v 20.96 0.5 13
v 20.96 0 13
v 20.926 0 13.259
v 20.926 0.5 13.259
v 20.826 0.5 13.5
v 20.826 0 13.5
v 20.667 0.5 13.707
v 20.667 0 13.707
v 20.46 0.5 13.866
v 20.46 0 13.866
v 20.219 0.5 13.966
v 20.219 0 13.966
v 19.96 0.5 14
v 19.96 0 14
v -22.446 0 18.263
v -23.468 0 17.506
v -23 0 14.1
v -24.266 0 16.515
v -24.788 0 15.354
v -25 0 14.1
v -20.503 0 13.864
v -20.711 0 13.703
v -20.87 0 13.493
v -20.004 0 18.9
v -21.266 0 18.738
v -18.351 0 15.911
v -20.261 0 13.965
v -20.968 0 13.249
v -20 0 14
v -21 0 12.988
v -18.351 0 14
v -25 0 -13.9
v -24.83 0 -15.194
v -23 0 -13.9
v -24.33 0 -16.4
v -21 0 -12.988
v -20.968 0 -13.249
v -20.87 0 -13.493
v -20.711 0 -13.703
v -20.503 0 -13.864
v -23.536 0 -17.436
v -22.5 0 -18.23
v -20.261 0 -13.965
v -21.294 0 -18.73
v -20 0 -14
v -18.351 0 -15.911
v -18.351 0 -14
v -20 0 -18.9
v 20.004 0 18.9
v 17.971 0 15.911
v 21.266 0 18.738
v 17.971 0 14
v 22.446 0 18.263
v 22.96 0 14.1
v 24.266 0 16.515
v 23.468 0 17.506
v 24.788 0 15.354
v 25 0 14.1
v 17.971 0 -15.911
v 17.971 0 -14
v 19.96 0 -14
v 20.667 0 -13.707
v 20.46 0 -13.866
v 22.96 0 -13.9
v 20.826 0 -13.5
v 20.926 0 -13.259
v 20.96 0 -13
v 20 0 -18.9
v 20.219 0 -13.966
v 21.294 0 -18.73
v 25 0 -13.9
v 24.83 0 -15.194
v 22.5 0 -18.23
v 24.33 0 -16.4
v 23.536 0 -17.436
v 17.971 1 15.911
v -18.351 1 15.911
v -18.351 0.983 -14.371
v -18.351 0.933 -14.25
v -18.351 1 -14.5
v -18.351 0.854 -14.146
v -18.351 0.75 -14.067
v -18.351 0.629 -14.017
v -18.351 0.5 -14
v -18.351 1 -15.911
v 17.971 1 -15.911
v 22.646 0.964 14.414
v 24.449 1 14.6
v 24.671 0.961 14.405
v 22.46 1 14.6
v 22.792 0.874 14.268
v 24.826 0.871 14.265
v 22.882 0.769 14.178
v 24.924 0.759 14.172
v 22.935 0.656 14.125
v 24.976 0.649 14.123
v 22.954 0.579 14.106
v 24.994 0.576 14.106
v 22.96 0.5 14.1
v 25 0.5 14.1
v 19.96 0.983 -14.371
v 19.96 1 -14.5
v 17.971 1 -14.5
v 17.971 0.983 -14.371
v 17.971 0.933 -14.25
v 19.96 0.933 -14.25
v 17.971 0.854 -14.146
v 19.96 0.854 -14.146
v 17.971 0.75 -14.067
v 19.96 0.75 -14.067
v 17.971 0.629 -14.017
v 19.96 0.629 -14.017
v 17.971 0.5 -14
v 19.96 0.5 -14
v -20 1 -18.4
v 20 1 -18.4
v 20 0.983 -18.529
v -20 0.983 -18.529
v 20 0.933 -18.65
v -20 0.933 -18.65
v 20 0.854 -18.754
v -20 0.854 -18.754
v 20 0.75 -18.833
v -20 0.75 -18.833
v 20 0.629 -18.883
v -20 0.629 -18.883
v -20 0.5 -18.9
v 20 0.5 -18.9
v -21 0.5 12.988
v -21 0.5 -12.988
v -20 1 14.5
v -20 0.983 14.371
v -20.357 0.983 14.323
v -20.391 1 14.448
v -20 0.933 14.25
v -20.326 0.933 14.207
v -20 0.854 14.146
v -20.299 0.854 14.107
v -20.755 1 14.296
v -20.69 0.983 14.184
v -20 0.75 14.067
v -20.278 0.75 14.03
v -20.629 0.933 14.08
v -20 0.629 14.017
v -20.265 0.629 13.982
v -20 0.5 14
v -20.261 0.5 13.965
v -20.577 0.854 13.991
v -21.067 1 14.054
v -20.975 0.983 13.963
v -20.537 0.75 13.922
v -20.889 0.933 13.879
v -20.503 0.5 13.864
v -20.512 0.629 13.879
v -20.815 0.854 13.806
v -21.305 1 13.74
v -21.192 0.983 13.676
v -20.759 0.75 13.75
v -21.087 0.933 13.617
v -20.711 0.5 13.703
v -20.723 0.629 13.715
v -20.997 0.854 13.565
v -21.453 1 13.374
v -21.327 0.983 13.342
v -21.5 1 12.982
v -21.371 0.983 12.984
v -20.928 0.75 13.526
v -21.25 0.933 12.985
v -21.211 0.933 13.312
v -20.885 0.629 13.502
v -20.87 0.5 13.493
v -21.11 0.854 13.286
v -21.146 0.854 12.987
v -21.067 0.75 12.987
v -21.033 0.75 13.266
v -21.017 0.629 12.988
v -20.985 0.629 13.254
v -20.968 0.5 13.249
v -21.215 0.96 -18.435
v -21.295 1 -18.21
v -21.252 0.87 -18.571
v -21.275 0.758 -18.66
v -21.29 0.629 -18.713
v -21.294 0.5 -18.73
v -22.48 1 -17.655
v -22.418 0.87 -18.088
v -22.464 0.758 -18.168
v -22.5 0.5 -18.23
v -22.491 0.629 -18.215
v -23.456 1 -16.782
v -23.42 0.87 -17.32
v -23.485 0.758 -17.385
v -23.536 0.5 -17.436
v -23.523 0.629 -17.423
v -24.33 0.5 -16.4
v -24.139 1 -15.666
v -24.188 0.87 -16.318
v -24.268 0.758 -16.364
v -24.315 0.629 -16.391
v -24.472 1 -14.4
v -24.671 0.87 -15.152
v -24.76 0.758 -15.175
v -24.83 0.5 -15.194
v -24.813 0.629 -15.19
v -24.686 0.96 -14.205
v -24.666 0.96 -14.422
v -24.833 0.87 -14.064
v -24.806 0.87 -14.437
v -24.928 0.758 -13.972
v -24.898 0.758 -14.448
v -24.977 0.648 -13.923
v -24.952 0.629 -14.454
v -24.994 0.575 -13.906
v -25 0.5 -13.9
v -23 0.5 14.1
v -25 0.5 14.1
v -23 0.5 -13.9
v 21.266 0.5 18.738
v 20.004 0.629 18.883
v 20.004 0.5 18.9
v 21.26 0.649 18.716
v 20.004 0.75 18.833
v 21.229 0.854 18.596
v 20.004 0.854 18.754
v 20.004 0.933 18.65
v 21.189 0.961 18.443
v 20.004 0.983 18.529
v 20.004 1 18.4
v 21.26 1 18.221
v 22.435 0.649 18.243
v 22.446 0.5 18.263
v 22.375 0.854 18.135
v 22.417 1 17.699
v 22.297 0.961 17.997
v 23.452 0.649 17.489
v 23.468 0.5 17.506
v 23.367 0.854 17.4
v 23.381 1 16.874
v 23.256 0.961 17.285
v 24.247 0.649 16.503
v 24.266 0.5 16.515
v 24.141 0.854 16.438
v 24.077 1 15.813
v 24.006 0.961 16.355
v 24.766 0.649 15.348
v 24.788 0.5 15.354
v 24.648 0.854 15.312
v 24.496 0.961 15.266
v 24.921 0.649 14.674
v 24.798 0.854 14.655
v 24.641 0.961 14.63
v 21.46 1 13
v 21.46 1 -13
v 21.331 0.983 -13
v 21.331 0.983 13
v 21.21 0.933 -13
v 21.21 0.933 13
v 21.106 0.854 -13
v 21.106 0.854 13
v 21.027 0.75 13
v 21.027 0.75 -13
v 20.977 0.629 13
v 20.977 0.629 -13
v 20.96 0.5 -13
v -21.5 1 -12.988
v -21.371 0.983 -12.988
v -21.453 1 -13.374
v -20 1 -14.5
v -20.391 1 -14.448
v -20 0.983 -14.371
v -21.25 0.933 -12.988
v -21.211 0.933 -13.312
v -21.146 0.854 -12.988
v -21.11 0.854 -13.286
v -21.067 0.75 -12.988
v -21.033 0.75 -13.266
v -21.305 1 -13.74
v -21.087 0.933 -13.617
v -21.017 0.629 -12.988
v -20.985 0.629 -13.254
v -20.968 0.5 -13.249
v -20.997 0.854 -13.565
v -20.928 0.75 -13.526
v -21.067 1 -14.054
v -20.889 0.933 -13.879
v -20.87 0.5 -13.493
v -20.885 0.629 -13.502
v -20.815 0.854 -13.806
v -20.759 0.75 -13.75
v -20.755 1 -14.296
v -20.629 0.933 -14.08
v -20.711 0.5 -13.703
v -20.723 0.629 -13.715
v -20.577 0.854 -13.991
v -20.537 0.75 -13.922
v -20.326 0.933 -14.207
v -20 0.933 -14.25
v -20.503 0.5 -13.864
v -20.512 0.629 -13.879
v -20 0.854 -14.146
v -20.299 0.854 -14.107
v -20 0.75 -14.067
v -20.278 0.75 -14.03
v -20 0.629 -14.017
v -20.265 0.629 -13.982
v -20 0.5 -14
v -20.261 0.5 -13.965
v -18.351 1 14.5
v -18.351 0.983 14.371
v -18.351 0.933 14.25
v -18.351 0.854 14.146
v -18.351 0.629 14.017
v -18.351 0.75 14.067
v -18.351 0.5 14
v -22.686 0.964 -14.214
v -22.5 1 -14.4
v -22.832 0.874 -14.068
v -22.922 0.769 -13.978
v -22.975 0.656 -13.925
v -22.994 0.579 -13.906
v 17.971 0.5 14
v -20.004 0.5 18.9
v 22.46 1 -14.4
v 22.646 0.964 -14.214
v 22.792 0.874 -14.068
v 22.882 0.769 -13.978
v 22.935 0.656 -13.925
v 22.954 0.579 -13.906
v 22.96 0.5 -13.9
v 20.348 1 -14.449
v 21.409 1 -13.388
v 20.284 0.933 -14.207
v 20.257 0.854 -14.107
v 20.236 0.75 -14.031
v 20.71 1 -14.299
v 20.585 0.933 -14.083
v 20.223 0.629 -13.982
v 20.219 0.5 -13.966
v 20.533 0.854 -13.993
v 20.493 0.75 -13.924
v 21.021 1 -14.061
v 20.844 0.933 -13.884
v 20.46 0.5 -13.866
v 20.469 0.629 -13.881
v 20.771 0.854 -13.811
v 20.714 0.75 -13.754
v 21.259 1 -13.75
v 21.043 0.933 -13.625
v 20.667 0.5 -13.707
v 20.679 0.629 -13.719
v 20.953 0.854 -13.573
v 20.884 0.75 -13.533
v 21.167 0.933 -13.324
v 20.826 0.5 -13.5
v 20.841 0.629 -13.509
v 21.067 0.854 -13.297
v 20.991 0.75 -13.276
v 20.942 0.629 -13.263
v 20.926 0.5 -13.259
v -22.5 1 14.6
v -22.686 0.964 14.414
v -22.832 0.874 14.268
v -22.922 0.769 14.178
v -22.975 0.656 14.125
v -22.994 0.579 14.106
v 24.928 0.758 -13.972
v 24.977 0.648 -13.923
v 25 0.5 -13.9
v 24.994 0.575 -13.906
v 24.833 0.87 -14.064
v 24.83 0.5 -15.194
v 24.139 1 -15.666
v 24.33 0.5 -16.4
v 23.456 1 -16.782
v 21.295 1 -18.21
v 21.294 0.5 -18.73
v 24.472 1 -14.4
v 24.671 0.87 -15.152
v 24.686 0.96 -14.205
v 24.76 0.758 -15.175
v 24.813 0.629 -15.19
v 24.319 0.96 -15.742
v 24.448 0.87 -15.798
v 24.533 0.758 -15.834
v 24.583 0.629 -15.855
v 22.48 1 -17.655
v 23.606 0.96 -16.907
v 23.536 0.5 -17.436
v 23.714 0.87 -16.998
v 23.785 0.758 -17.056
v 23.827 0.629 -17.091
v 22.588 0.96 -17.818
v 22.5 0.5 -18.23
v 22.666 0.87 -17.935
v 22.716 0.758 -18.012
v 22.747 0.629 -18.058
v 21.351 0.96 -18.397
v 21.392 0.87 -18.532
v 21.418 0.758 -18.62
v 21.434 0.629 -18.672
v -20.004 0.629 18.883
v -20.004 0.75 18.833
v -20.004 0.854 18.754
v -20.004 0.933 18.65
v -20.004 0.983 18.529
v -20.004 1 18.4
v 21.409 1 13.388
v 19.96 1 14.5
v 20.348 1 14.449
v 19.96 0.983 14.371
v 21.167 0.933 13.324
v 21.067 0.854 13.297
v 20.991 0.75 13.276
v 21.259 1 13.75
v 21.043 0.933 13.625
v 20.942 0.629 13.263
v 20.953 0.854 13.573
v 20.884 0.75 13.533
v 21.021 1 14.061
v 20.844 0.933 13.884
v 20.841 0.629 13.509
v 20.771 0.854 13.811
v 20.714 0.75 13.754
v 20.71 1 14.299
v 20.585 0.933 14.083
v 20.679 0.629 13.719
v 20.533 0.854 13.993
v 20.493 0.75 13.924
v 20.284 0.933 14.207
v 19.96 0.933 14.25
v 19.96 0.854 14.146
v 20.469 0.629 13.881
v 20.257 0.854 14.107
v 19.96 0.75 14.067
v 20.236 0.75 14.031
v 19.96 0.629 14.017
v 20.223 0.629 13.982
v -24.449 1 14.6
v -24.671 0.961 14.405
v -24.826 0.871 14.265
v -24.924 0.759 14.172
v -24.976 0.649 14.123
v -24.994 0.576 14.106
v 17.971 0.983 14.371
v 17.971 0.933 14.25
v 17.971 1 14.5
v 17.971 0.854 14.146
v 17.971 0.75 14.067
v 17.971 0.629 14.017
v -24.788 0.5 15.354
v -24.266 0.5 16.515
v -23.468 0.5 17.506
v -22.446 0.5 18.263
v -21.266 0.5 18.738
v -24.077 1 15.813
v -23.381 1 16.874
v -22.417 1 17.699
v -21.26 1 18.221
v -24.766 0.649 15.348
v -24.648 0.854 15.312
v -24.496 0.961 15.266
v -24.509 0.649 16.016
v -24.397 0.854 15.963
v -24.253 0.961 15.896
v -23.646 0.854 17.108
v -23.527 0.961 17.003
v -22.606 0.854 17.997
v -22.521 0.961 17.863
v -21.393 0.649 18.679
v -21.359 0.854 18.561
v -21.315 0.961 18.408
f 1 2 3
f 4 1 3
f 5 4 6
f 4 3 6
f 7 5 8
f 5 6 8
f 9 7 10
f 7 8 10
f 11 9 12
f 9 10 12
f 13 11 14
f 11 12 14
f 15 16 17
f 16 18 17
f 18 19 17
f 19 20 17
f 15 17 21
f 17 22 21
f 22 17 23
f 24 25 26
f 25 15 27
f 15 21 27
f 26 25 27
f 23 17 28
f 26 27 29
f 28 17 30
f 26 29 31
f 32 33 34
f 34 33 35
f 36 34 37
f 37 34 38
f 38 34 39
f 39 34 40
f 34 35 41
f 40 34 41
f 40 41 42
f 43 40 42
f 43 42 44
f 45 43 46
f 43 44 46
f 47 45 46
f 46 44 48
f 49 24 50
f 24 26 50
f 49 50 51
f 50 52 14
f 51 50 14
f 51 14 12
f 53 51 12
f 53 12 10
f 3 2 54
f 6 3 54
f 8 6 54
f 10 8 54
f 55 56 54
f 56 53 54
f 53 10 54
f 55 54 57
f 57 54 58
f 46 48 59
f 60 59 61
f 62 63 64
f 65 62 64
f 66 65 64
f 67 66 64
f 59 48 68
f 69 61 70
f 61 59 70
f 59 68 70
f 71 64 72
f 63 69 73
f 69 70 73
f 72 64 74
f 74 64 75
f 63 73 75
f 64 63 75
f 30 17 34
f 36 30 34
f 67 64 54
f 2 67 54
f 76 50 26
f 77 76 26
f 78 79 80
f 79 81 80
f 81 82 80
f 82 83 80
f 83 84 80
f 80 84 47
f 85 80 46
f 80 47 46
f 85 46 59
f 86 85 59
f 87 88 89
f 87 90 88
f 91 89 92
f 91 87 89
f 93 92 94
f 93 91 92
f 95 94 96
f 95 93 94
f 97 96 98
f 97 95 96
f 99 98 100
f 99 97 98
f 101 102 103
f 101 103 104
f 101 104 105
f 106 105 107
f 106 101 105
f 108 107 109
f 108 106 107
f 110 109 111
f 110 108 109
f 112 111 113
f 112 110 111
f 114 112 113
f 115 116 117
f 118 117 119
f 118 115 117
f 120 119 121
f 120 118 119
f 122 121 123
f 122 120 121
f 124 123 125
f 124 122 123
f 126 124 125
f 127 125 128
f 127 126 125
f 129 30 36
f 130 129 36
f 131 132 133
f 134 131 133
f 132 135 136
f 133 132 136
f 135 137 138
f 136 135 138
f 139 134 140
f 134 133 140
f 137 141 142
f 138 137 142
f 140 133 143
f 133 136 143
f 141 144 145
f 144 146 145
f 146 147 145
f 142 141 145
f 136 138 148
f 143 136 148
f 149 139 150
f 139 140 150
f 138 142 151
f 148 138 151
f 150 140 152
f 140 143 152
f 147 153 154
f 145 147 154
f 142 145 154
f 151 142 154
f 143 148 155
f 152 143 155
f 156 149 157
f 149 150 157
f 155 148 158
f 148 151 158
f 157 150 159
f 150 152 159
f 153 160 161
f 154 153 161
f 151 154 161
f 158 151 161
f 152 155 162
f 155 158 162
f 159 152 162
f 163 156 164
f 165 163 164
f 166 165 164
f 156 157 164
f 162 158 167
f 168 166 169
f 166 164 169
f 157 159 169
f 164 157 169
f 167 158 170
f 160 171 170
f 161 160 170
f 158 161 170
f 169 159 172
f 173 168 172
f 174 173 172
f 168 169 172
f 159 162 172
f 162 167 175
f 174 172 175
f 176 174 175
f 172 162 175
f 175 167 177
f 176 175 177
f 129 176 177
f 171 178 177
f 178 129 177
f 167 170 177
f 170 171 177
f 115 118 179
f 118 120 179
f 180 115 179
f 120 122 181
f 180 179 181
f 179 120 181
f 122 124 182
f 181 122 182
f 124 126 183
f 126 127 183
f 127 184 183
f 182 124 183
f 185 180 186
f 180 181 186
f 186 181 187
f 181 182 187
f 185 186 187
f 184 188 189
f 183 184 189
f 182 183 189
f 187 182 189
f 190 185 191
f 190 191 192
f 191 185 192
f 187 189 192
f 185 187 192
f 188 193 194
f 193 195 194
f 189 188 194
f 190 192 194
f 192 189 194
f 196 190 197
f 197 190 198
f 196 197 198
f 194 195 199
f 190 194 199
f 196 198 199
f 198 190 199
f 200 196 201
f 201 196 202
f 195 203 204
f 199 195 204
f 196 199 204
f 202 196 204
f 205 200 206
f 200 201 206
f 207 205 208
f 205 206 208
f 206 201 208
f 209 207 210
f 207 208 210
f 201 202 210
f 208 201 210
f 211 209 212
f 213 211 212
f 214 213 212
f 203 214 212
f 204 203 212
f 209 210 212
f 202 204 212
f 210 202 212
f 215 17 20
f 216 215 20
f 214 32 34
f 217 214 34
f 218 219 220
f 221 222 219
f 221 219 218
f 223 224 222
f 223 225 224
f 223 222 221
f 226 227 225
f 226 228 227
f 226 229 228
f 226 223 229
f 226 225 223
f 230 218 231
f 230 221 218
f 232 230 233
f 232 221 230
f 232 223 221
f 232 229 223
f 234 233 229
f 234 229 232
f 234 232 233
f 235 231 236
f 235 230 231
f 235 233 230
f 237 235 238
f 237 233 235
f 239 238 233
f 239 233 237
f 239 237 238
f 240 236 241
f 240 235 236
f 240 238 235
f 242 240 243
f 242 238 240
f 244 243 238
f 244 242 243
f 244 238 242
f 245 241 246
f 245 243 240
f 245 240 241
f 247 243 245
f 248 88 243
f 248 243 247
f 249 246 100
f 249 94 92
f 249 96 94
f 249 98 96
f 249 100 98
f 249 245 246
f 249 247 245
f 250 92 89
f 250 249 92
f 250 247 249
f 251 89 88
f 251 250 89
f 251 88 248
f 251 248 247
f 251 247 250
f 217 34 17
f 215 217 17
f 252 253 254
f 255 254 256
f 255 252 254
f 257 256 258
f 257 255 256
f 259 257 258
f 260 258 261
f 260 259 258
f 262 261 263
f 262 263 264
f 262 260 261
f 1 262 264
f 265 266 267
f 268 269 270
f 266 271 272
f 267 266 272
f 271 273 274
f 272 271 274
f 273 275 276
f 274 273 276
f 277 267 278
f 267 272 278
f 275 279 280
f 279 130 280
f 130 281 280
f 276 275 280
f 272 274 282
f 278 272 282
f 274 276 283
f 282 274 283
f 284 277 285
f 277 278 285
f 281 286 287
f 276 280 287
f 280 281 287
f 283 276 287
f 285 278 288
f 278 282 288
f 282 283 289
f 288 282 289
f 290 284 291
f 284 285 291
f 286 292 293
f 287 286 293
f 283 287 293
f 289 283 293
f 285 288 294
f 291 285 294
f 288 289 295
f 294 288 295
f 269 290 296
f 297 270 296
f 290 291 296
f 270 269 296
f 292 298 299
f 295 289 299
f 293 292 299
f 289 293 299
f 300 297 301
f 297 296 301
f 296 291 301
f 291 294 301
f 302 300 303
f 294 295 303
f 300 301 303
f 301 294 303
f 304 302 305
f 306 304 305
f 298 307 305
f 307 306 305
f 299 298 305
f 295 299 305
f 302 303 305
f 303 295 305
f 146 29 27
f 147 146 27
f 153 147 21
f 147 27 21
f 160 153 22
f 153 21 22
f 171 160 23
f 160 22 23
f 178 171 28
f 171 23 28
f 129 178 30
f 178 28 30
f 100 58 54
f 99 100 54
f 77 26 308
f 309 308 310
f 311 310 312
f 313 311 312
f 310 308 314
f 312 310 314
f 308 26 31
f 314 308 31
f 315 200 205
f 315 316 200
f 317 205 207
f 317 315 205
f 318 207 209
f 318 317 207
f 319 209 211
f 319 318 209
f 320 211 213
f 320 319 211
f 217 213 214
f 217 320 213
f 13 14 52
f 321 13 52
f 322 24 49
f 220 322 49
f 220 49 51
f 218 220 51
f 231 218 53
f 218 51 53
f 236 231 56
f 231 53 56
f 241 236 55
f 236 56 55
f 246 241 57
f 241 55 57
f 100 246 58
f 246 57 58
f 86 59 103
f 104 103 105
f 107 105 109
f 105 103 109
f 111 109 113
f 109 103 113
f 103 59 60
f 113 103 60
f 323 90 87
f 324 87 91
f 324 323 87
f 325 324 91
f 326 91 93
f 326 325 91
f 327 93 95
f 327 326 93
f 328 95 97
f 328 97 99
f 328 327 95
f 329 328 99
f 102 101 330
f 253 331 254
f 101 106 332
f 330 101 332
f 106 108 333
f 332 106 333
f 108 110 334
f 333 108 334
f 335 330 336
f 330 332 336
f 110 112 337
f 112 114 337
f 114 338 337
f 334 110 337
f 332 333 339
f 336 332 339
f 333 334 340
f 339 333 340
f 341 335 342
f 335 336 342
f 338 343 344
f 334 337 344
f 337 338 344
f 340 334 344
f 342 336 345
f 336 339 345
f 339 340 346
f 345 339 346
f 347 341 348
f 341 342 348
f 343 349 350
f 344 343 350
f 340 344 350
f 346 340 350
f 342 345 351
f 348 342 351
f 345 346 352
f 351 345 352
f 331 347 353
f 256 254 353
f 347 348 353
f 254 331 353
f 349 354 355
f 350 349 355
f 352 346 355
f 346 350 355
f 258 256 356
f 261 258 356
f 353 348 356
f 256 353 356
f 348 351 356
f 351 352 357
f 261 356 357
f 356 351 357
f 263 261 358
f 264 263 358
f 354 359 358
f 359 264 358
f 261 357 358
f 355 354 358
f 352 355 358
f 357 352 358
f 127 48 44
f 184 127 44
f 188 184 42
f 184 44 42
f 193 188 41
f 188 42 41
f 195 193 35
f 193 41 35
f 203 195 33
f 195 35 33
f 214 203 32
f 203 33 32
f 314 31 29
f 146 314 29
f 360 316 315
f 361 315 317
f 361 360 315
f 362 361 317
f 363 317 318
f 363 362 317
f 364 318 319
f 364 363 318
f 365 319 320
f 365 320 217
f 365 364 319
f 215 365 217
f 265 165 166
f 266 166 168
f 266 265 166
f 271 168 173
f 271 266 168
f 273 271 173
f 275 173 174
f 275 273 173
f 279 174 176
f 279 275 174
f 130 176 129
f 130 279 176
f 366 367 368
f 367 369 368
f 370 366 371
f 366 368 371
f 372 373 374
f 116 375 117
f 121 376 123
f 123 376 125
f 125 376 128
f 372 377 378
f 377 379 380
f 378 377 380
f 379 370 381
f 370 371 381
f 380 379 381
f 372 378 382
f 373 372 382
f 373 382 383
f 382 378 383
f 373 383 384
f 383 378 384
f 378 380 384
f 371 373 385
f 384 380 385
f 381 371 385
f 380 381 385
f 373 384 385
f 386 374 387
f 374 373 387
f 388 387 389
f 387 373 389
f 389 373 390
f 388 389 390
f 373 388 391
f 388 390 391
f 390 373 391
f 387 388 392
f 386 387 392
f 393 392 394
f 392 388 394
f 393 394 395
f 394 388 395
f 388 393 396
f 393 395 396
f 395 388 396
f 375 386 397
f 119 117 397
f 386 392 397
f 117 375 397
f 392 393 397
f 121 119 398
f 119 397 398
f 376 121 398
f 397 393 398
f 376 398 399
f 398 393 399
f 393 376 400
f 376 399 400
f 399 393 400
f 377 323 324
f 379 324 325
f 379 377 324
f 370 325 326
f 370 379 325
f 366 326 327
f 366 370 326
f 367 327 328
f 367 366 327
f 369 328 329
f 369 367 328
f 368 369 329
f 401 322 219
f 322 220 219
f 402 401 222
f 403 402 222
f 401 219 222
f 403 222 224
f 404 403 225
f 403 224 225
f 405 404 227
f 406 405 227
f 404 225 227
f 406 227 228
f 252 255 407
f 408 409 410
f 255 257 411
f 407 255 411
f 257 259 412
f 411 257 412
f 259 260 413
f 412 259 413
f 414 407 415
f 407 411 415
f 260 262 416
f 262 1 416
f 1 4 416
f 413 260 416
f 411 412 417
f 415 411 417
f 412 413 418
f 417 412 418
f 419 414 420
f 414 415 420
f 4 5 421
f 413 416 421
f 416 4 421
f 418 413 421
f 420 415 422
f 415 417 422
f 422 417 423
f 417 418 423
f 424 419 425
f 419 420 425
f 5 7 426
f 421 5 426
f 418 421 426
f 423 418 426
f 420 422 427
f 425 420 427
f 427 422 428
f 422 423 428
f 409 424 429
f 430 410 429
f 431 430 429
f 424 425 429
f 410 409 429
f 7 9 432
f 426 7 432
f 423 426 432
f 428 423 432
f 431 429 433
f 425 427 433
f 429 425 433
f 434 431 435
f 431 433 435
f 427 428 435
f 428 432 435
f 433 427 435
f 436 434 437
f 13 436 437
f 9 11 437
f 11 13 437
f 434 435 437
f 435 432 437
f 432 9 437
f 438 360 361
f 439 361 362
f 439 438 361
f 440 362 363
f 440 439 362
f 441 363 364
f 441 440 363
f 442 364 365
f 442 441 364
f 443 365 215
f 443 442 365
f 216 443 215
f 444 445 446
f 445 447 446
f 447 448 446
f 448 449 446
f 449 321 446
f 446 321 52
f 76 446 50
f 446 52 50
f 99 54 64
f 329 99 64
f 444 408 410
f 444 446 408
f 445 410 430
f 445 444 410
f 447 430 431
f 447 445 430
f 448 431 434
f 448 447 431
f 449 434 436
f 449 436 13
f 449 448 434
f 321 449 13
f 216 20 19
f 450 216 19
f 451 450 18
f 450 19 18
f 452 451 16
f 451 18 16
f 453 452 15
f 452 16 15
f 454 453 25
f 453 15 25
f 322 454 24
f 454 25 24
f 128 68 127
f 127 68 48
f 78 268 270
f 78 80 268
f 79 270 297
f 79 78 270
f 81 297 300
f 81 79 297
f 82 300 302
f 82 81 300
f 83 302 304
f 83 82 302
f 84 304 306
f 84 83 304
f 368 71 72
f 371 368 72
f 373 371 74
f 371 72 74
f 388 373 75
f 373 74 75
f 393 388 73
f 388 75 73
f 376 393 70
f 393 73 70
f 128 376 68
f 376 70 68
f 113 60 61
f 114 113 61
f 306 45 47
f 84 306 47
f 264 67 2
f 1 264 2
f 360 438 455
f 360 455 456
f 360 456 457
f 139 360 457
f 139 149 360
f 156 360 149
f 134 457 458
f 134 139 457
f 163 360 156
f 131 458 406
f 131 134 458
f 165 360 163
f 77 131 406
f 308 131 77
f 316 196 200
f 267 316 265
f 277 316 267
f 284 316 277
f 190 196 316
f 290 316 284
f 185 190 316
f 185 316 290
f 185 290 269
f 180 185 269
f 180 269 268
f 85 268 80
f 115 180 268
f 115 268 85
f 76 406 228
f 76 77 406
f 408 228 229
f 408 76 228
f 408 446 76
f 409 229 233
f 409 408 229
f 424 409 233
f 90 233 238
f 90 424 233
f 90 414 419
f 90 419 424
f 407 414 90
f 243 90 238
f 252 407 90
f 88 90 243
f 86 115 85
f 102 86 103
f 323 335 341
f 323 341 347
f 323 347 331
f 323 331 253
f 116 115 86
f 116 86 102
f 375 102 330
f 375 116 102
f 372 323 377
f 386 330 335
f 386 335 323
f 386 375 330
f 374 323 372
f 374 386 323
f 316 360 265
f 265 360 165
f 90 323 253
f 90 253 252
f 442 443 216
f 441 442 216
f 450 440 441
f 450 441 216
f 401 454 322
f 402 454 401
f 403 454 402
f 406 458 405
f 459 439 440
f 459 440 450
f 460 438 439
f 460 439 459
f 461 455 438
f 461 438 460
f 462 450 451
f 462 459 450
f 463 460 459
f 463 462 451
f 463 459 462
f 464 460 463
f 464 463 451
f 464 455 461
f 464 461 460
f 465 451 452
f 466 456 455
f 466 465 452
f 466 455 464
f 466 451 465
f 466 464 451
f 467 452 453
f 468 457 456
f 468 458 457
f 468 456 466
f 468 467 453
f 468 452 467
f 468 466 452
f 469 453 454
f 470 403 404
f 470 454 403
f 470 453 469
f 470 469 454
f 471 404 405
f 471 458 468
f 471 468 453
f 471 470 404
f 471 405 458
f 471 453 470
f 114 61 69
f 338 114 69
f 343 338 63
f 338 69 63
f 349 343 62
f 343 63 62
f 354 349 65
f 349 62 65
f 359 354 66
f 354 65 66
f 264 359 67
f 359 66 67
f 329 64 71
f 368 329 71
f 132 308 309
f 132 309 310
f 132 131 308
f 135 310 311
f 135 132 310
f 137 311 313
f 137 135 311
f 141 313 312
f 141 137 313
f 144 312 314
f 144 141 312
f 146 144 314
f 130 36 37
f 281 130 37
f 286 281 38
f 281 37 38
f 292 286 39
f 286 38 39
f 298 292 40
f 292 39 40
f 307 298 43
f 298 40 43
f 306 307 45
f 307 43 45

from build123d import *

# Parameters (mm, degrees)
BOSS_EXTRUDE1_DEPTH = 1
FILLET1_R           = 5
FILLET2_R           = 0.5


with BuildPart() as part:
    # Sketch1 → Boss-Extrude1 (new body)
    with BuildSketch(Plane(origin=(0, 0, 0), x_dir=(1, 0, 0), z_dir=(0, 1, 0))):
        Polygon((-25, -18.9), (25, -18.9), (25, -14.1), (22.96, -14.1), (22.96, 13.9), (25, 13.9), (25, 18.9), (-25, 18.9), (-25, 13.9), (-23, 13.9), (-23, -14.1), (-25, -14.1), align=None)
        with BuildLine():
            Line((-18.351, 15.911365238), (17.970976359, 15.911365238))
            Line((17.970976359, 15.911365238), (17.971, 14))
            Line((17.971, 14), (19.96, 14))
            ThreePointArc((19.96, 14), (20.667106781, 13.707106781), (20.96, 13))
            Line((20.96, 13), (20.96, -13))
            ThreePointArc((20.96, -13), (20.667106781, -13.707106781), (19.96, -14))
            Line((19.96, -14), (17.971, -14))
            Line((17.971, -14), (17.971, -15.911365238))
            Line((17.971, -15.911365238), (-18.351, -15.911365238))
            Line((-18.351, -15.911365238), (-18.351, -14))
            Line((-18.351, -14), (-20, -14))
            ThreePointArc((-20, -14), (-20.711257423, -13.702939741), (-21, -12.988265238))
            Line((-21, -12.988265238), (-21, 12.988265238))
            ThreePointArc((-21, 12.988265238), (-20.711254501, 13.702936852), (-20, 14))
            Line((-20, 14), (-18.351, 14))
            Line((-18.351, 14), (-18.351, 15.911365238))
        make_face(mode=Mode.SUBTRACT)
    extrude(amount=BOSS_EXTRUDE1_DEPTH)

    # Fillet1
    # the kernel refuses this fillet: 5 mm, written as the material it takes off along each edge
    with BuildSketch(Plane(origin=(25, -12.489995997, 18.9), x_dir=(-1, 0, 0), z_dir=(0, 1, 0))) as fillet1_piece_1:
        with BuildLine():
            CenterArc((4.995998399, -5), FILLET1_R, 90, 87.707557224)
            Line((0, -4.8), (-0.099919968, -4.796))
            ThreePointArc((-0.099919968, -4.796), (-0.1, -2.4), (-0.1, 0))
            Line((-0.1, 0), (0, 0.1))
            Line((0, 0.1), (4.995998399, 0.1))
            Line((4.995998399, 0.1), (4.995998399, 0))
        make_face()
    extrude(amount=25.979991994, mode=Mode.SUBTRACT)
    with BuildSketch(Plane(origin=(-25, -12.489995997, 18.9), x_dir=(1, 0, 0), z_dir=(0, 1, 0))) as fillet1_piece_2:
        with BuildLine():
            CenterArc((4.995998399, 5), FILLET1_R, 182.292442776, 87.707557224)
            Line((0, 4.8), (-0.099919968, 4.796))
            ThreePointArc((-0.099919968, 4.796), (-0.1, 2.4), (-0.1, 0))
            Line((-0.1, 0), (0, -0.1))
            Line((0, -0.1), (4.995998399, -0.1))
            Line((4.995998399, -0.1), (4.995998399, 0))
        make_face()
    extrude(amount=25.979991994, mode=Mode.SUBTRACT)
    with BuildSketch(Plane(origin=(-25, -12.5, -18.9), x_dir=(1, 0, 0), z_dir=(0, 1, 0)), Plane(origin=(25, -12.5, -18.9), x_dir=(0, 0, 1), z_dir=(0, 1, 0))) as fillet1_piece_3:
        with BuildLine():
            CenterArc((FILLET1_R, -FILLET1_R), FILLET1_R, 90, 90)
            Line((0, -FILLET1_R), (-FILLET1_R * 0.02, -FILLET1_R))
            Line((-FILLET1_R * 0.02, -FILLET1_R), (-FILLET1_R * 0.02, FILLET1_R * 0.02))
            Line((-FILLET1_R * 0.02, FILLET1_R * 0.02), (FILLET1_R, FILLET1_R * 0.02))
            Line((FILLET1_R, FILLET1_R * 0.02), (FILLET1_R, 0))
        make_face()
    extrude(amount=26, mode=Mode.SUBTRACT)

    # Fillet2
    fillet2_edges = [part.edges().sort_by_distance(p)[0] for p in [
        (-24, 1, -13.9),
        (-23, 1, 0.1),
        (-24, 1, 14.1),
        (23.98, 1, 14.1),
        (22.96, 1, 0.1),
        (23.98, 1, -13.9),
        (-19.1755, 1, -14),
        (-20.711254501, 1, -13.702936852),
        (-21, 1, 0),
        (-20.711257423, 1, 13.702939741),
        (-19.1755, 1, 14),
        (18.9655, 1, 14),
        (20.667106781, 1, 13.707106781),
        (20.96, 1, 0),
        (20.667106781, 1, -13.707106781),
        (18.9655, 1, -14),
        (0, 1, -18.9),
        (0, 1, 18.9),
        (-23.468103216, 1, 17.505551275),
        (23.468103216, 1, 17.505551275),
        (23.535533906, 1, -17.435533906),
        (-23.535533906, 1, -17.435533906),
    ]]
    fillet(fillet2_edges, radius=FILLET2_R)


solid = part.part
